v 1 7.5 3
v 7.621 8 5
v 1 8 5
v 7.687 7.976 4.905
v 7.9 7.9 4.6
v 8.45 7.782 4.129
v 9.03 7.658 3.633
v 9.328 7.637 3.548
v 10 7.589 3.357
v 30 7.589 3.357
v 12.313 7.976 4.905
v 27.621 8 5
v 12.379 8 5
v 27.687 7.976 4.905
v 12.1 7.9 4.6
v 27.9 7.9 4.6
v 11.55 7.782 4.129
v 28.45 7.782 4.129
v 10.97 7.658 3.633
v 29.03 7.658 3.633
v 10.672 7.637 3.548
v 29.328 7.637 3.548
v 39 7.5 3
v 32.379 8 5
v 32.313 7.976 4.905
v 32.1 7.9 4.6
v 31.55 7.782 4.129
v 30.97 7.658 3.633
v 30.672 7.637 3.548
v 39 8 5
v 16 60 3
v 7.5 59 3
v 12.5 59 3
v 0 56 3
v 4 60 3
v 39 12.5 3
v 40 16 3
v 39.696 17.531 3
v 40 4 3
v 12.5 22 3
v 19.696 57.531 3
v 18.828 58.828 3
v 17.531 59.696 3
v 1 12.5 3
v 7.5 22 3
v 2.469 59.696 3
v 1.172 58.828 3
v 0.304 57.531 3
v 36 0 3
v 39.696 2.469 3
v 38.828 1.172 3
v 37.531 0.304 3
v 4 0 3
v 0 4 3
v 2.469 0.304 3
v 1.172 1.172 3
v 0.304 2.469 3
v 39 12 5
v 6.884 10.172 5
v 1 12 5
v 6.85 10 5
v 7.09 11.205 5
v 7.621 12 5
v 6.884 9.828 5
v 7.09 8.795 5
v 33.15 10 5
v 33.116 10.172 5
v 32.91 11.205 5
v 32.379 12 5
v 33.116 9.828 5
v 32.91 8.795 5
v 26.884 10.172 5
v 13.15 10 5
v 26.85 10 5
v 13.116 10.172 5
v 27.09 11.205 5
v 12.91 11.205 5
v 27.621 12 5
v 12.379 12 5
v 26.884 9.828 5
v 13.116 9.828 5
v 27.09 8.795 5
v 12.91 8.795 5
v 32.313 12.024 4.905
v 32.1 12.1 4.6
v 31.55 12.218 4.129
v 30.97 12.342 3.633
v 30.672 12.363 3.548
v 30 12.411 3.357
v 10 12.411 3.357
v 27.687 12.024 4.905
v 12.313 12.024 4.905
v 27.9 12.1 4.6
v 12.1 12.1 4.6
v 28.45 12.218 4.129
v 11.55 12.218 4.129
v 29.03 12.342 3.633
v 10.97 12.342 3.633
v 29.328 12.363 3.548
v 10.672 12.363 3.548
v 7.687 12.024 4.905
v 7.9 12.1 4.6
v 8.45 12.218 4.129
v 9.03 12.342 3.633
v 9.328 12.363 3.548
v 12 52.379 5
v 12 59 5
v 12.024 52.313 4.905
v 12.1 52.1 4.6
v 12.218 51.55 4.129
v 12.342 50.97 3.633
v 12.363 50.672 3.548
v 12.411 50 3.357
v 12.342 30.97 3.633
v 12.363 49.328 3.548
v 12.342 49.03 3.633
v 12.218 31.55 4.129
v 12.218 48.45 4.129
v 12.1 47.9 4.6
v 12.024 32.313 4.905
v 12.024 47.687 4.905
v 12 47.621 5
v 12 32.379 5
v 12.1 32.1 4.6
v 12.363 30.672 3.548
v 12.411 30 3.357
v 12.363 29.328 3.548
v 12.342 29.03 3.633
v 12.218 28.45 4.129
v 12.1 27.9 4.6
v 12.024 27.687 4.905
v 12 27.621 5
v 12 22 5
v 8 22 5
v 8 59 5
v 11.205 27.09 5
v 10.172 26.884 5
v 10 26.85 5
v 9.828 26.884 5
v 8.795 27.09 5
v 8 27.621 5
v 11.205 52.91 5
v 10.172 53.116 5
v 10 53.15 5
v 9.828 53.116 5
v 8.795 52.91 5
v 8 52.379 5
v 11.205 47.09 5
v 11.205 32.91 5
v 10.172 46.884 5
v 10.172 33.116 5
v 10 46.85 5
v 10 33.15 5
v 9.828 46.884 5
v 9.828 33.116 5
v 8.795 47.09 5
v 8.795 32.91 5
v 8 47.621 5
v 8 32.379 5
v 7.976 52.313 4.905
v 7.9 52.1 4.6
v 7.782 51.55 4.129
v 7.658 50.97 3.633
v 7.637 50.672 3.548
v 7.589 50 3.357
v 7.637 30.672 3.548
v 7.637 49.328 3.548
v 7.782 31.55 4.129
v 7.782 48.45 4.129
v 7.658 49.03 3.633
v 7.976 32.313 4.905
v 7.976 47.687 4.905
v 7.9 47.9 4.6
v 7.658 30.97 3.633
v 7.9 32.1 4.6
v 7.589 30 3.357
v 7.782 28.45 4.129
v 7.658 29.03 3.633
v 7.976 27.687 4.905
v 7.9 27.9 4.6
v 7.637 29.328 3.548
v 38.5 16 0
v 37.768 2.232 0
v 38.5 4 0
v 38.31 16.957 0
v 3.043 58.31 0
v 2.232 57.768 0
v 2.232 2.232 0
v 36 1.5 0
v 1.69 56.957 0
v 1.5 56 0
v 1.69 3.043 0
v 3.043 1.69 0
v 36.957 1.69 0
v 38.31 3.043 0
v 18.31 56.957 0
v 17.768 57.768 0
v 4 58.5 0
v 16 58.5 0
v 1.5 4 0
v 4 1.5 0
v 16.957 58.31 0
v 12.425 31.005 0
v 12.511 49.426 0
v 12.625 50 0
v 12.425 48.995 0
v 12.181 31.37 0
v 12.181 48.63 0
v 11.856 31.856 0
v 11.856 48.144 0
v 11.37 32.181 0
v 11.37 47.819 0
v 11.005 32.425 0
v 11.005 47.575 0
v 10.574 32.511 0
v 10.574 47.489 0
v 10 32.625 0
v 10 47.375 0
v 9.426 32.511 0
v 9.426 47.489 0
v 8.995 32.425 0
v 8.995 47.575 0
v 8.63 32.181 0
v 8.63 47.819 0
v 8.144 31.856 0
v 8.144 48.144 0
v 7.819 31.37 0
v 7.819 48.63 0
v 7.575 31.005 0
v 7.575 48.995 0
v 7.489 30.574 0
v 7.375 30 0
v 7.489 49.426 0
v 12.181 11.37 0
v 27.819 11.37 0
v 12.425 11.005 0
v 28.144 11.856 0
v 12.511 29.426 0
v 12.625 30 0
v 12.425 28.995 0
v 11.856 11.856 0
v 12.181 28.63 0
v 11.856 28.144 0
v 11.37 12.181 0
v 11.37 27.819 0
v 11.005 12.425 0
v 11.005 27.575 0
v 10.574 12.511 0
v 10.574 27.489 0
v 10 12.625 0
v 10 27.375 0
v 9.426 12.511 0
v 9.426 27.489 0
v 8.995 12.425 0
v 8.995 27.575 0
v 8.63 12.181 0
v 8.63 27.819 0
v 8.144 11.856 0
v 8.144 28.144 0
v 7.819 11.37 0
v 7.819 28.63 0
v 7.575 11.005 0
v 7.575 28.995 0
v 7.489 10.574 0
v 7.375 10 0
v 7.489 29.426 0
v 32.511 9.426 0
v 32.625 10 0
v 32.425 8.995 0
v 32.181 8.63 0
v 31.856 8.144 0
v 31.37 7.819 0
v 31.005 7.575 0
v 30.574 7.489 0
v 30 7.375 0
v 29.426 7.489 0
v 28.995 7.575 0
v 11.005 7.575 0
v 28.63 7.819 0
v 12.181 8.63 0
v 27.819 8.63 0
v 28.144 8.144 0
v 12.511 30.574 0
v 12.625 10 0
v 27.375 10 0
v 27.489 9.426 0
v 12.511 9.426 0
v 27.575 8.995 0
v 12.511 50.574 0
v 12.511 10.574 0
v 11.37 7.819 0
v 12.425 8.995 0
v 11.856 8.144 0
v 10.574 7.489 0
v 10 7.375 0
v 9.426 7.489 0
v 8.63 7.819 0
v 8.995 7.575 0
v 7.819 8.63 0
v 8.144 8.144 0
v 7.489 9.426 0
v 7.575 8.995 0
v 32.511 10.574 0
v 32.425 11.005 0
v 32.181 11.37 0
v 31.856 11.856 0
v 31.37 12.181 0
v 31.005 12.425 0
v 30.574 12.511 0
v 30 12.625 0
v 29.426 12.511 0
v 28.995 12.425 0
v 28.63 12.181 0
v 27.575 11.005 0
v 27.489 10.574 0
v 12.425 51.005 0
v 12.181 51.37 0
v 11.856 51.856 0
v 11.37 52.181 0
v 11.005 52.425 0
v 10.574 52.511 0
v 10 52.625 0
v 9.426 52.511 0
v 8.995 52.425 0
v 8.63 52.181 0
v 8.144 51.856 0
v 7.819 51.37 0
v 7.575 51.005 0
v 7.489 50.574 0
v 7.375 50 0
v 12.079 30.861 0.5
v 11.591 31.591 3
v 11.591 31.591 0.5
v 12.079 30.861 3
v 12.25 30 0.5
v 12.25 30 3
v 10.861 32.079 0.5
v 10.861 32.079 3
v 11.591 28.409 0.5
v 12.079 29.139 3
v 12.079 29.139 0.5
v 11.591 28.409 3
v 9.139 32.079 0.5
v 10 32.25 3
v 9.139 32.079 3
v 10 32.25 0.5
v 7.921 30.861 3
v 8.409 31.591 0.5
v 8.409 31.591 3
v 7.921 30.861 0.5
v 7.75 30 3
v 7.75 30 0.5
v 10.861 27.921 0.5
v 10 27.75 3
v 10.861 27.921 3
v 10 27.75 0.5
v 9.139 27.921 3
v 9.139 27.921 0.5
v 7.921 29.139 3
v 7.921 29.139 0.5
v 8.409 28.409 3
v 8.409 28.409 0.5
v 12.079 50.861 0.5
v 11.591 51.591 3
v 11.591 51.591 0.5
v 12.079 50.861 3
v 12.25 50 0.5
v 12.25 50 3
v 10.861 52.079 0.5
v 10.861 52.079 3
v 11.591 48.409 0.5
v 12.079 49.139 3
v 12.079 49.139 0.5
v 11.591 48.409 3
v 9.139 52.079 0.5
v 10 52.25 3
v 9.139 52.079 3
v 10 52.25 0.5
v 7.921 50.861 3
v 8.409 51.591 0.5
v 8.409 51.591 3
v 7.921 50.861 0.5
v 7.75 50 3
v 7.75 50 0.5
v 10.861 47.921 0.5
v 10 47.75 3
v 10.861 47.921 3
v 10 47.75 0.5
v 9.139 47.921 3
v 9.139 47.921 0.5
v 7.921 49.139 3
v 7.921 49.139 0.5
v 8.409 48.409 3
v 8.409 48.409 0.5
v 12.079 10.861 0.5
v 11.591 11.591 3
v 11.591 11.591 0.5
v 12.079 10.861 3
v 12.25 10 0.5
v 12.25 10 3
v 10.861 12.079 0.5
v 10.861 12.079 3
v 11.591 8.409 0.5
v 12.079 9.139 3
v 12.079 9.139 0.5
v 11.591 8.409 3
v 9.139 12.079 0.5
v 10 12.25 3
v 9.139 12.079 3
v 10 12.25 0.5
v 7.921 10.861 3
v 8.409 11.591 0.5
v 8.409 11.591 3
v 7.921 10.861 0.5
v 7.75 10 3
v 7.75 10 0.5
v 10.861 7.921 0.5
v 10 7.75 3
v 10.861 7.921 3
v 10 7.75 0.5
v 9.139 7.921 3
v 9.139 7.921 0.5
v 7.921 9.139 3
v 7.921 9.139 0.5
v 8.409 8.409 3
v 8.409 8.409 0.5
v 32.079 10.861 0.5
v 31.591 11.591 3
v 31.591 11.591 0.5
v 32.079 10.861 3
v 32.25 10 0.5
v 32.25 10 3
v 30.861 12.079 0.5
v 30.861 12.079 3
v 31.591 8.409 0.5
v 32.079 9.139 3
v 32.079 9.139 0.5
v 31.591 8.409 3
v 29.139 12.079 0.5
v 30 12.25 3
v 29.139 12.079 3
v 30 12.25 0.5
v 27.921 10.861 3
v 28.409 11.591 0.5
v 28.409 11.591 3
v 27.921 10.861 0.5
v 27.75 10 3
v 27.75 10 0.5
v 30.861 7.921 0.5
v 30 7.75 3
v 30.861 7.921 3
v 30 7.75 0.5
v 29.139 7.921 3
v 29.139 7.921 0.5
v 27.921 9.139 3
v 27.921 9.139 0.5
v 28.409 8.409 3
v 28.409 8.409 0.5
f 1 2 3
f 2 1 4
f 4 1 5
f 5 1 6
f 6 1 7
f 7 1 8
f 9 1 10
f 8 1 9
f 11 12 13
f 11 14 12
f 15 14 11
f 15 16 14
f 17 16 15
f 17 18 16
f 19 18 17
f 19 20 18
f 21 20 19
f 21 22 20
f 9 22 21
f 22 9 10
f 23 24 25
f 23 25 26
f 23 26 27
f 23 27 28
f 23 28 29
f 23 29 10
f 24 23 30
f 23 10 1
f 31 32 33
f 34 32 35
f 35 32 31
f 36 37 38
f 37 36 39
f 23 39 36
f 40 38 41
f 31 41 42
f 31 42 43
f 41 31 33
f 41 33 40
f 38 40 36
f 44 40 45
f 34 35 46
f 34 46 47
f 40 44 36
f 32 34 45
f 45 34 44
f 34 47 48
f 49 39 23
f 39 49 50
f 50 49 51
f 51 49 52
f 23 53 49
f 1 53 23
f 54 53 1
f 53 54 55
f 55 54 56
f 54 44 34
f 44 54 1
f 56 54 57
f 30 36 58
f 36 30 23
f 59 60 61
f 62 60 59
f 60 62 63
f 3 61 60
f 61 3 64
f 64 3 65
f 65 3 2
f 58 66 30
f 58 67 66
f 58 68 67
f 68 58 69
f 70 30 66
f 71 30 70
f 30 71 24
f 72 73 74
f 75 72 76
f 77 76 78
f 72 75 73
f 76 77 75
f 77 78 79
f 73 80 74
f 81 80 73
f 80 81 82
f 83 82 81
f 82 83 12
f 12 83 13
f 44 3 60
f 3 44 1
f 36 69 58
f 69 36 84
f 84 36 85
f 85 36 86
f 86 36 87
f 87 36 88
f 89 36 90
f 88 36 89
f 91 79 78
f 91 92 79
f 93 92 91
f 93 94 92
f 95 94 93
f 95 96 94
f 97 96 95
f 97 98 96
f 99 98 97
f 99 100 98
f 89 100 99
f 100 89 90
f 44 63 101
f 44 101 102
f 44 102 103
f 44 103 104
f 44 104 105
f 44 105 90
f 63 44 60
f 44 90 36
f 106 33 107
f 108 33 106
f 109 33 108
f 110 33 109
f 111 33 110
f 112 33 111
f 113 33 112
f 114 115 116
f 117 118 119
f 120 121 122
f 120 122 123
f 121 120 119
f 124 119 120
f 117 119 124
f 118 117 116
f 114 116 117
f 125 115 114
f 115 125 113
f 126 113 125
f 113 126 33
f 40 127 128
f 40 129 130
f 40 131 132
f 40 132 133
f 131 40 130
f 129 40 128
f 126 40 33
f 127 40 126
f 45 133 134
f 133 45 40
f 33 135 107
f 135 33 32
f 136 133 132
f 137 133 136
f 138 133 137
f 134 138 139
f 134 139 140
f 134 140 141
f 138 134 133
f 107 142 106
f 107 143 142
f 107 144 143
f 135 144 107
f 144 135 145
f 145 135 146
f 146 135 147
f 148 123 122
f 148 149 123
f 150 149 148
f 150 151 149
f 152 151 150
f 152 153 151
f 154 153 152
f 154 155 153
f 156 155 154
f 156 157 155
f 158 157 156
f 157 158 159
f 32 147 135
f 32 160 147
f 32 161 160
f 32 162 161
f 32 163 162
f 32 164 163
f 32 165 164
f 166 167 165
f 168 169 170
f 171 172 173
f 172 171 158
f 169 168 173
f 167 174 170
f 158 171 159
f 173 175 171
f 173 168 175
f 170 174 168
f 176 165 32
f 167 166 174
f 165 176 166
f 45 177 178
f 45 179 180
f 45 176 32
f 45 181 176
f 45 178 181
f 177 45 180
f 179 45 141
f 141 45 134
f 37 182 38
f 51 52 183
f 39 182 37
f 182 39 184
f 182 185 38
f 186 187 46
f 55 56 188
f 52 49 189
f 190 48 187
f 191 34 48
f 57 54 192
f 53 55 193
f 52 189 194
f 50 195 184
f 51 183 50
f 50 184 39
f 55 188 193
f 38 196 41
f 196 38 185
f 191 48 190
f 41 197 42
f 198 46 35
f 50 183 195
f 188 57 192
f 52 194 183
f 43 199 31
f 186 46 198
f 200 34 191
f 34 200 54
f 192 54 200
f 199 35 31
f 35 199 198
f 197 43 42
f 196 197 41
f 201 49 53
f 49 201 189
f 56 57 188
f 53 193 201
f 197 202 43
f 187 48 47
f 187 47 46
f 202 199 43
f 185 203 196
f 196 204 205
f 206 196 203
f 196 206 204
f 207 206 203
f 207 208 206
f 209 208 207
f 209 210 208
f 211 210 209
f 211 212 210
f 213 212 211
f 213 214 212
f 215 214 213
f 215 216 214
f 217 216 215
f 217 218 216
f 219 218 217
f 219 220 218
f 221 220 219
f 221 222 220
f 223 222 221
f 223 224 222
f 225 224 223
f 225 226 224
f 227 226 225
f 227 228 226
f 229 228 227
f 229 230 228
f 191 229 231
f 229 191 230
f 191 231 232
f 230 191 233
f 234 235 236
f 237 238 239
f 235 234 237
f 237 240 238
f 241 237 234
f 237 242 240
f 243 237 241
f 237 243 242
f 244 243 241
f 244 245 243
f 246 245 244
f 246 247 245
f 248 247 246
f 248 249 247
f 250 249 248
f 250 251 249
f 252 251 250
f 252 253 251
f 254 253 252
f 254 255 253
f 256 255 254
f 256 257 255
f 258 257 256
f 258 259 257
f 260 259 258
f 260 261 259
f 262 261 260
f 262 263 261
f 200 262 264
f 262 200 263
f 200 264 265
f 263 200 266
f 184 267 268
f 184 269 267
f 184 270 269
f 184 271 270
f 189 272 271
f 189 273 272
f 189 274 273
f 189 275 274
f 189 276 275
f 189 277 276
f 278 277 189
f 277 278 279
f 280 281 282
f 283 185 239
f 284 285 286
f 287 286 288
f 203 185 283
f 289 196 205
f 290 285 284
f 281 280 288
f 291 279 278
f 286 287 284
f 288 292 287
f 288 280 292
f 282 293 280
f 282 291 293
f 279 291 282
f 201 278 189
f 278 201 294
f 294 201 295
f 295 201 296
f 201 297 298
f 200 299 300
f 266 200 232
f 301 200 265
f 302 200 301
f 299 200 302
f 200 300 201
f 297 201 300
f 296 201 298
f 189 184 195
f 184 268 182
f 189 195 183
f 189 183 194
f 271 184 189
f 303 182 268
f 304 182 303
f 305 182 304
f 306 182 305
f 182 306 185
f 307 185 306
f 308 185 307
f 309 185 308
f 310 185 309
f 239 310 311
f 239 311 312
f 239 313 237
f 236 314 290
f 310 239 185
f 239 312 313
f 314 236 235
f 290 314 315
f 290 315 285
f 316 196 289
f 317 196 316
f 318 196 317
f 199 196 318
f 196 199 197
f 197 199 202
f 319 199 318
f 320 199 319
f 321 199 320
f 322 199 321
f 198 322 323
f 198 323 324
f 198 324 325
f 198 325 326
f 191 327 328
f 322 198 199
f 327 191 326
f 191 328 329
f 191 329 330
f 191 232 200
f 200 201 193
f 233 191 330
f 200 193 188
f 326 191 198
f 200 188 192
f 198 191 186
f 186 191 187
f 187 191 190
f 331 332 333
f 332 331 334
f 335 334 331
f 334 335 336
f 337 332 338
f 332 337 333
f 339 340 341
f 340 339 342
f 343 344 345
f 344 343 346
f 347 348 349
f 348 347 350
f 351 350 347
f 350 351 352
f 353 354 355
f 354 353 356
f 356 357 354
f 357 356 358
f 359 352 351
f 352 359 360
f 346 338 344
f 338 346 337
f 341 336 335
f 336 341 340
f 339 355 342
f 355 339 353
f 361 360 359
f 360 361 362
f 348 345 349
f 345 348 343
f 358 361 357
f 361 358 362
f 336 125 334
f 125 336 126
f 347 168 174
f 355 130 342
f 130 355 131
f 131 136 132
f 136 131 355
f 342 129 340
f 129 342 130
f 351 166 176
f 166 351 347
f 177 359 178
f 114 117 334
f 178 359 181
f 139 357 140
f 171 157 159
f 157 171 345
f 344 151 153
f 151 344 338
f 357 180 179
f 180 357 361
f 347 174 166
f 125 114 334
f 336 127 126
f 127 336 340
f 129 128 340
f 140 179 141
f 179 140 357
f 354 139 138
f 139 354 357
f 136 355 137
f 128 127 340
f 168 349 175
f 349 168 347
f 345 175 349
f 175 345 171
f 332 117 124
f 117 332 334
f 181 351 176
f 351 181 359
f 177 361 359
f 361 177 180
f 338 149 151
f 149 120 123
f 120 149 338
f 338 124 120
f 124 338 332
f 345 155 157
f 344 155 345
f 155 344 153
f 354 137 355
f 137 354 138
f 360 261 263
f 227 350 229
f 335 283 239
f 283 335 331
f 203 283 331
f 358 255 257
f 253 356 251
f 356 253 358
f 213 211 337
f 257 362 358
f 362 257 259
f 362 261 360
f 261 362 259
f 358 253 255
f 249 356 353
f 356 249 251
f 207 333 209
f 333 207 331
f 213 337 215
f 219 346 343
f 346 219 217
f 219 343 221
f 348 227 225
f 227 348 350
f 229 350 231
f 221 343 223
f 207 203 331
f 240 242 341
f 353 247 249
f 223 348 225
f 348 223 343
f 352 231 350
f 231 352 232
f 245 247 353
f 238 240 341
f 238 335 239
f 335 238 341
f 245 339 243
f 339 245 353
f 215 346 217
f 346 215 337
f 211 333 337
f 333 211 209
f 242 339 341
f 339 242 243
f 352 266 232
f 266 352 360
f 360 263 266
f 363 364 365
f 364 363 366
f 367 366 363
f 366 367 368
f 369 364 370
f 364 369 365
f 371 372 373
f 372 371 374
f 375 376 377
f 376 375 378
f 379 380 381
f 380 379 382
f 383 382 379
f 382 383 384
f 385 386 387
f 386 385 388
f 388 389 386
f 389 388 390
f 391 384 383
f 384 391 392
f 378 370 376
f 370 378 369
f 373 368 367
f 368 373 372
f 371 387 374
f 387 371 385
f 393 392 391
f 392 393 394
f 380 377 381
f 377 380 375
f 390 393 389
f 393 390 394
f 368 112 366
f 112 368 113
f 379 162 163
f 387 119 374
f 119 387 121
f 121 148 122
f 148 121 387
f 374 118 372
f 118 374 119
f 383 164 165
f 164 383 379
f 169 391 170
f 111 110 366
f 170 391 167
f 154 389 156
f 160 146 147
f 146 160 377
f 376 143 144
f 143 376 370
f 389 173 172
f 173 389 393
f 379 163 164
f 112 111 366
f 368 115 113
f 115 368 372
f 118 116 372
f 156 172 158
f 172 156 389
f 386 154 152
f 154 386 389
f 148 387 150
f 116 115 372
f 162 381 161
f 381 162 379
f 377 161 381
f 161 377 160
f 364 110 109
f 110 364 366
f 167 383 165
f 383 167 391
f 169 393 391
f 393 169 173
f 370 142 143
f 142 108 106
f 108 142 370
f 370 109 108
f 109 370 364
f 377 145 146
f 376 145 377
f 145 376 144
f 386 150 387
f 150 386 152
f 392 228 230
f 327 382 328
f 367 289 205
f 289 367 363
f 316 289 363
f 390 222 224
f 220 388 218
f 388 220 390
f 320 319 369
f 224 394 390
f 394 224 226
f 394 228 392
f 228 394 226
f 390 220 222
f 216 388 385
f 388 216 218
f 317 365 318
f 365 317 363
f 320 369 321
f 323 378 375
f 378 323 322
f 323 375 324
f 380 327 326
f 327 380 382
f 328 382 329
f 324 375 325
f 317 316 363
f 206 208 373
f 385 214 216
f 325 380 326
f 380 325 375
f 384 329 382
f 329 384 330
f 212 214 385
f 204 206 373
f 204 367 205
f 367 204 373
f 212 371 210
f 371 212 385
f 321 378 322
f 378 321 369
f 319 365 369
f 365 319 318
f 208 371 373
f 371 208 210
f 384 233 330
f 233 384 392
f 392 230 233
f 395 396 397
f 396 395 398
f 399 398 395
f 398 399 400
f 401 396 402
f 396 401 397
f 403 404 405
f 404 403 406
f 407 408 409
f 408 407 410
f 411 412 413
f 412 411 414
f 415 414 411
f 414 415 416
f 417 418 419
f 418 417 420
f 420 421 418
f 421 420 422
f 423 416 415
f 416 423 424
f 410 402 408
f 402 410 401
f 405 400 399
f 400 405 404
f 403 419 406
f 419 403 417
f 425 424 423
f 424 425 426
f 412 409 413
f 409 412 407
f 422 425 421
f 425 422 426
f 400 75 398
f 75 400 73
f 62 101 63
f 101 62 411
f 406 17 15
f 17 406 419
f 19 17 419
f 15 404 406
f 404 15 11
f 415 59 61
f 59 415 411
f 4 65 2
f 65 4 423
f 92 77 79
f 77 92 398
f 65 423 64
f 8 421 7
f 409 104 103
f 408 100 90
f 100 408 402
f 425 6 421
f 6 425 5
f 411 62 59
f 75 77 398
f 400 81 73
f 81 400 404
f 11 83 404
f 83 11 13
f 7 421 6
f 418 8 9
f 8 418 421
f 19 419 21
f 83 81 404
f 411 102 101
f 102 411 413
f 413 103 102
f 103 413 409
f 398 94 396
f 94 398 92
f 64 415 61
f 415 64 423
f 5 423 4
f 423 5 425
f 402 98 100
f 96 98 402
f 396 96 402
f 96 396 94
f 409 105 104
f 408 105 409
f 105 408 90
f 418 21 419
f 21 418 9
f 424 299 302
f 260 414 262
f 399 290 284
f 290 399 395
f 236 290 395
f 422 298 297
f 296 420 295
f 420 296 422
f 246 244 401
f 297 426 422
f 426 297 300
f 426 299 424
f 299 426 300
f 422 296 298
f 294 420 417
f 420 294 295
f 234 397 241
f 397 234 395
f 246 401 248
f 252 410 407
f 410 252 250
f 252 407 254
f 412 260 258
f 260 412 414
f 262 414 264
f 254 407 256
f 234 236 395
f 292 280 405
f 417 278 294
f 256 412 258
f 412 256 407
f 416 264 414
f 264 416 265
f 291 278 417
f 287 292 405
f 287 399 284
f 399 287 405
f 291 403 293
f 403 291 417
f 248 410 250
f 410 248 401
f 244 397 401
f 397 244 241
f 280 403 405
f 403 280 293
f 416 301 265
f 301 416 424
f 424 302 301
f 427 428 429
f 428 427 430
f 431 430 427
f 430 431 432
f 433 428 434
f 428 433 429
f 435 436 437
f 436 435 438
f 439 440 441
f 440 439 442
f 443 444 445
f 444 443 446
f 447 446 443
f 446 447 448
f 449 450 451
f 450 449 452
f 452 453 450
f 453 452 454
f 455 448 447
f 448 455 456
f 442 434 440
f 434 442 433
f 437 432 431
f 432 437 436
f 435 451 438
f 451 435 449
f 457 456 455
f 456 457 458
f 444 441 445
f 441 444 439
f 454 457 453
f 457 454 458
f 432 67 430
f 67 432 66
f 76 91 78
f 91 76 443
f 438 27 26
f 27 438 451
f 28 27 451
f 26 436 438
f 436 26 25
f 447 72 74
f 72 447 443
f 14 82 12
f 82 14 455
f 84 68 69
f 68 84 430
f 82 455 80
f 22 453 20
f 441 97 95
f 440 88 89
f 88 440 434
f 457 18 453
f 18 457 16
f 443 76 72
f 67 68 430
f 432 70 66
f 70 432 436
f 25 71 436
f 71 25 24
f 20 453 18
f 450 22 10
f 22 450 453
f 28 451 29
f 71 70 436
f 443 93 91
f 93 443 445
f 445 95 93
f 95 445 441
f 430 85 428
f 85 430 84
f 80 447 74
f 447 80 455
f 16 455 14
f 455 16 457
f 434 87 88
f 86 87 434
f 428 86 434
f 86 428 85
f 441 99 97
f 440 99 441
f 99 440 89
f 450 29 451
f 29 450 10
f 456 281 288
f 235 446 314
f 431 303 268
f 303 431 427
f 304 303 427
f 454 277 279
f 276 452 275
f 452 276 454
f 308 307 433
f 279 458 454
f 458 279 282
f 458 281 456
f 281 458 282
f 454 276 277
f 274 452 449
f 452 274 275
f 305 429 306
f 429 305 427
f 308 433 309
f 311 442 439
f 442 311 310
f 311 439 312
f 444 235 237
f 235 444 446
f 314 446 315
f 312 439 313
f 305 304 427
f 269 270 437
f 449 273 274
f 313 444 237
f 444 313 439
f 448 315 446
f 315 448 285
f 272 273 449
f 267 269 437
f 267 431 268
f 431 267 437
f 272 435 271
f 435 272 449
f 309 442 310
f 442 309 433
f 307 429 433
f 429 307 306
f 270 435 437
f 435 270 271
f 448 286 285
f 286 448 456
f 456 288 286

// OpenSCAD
// Width of extrusion beams
customizer_extrusion_w = 20;
// Width of channel in extrusion. Set to 0 to disable guides.
customizer_channel_w = 5;
// Number of holes of the base (the side with the guides the full length)
customizer_base_holes = 2;
// Number of holes of the riser (the side with partial length guides)
customizer_riser_holes = 2;
// Radius of mounting holes
customizer_hole_r = 2.25;
// Enable T bracket mode
customizer_t_bracket = 0; // [0,1]
// Thickness of the solid section of the bracket
thickness = 3;

module trapezoid(width_base, width_top,height,thickness) {

  linear_extrude(height = thickness) polygon(points=[[0,0],[width_base,0],[width_base-(width_base-width_top)/2,height],[(width_base-width_top)/2,height]], paths=[[0,1,2,3]]); 
  
}
        
// extrusion_w: Wide of extrusion pieces
// channel_w: Width of the extrusion's channel (guide will slope from this size to 80% of this size and be 40% of this size tall)
// base_holes: Number of mounting holes on the base (the side where the channel goes the entire length of the side)
// riser_holes: Number of mounting holes on the riser
// hole_r: Size of mounting holes
// corner_r: Corner rounding. Defaults to 25% extrusion width. 0 < corner_r <= 0.5 * extrusion_width
module l_bracket(extrusion_w, channel_w, base_holes, riser_holes, hole_r, corner_r = 0) {
    side_slope = 1.5;
    corner_r = corner_r <= 0 ? 0.2 * extrusion_w : corner_r > extrusion_w / 2 ? extrusion_w / 2 : corner_r;
    difference() {
        union() {
            hull() {
                perim_r1 = max(corner_r - side_slope, 0);
                // Origin corner
                translate([corner_r, corner_r, 0]) cylinder(r1=perim_r1, r2=corner_r, h=thickness, $fn=16);
                // Bottom right corner
                translate([(extrusion_w * base_holes) - corner_r, corner_r, 0]) cylinder(r1=perim_r1, r2=corner_r, h=thickness, $fn=16);
                // Top of base
                translate([(extrusion_w * base_holes) - corner_r, extrusion_w - corner_r, 0]) cylinder(r1=perim_r1, r2=corner_r, h=thickness, $fn=16);
                // Side of riser
                translate([corner_r, (extrusion_w * riser_holes) - corner_r + extrusion_w, 0]) cylinder(r1=perim_r1, r2=corner_r, h=thickness, $fn=16);
                // Top left corner
                translate([extrusion_w - corner_r, (extrusion_w * riser_holes) - corner_r + extrusion_w, 0]) cylinder(r1=perim_r1, r2=corner_r, h=thickness, $fn=16);
            }
            
            if (channel_w > 0)
            {
                translate([1, extrusion_w / 2 - channel_w / 2, thickness]) rotate([90, 0, 90]) trapezoid(channel_w, channel_w * 0.8, channel_w * 0.4, extrusion_w * base_holes - 2);
                translate([extrusion_w * 0.5 + channel_w * 0.5, extrusion_w * 1.1, thickness]) rotate([0, 90, 0]) rotate([0, 90, 90]) trapezoid(channel_w, channel_w * 0.8, channel_w * 0.4, extrusion_w * riser_holes - (extrusion_w * 0.1) - 1);
            }
        }
        for(i=[extrusion_w * 1.5:extrusion_w:extrusion_w * (0.5 + riser_holes)]) {
            translate([extrusion_w / 2, i, -1]) cylinder(r=hole_r, h=thickness + channel_w + 2, $fn=16);
            translate([extrusion_w / 2, i, thickness]) cylinder(r1=hole_r, r2 = hole_r * 1.5, h=channel_w * 0.5, $fn=16);
            translate([extrusion_w / 2, i, -1]) cylinder(r1=hole_r * 1.5, r2 = hole_r, h=1.5, $fn=16);
        }
        for(i=[extrusion_w/2:extrusion_w:extrusion_w * (0.5 + base_holes)]) {
            translate([i, extrusion_w / 2, -1]) cylinder(r=hole_r, h=thickness + channel_w + 2, $fn=16);
            translate([i, extrusion_w / 2, thickness]) cylinder(r1=hole_r, r2 = hole_r * 1.5, h=channel_w * 0.5, $fn=16);
            translate([i, extrusion_w / 2, -1]) cylinder(r1=hole_r * 1.5, r2 = hole_r, h=1.5, $fn=16);
        }

    }
}

// Cheap and dirty T bracket by mirroring and overlaying a pair of L brackets :)
module t_bracket(extrusion_w, channel_w, base_holes, riser_holes, hole_r, corner_r = 0) {
    l_bracket(extrusion_w, channel_w, base_holes, riser_holes, hole_r, corner_r);
    translate([extrusion_w, 0, 0]) mirror([1, 0, 0]) l_bracket(extrusion_w, channel_w, base_holes, riser_holes, hole_r, corner_r);
}

if (customizer_t_bracket > 0)
    t_bracket(customizer_extrusion_w, customizer_channel_w, customizer_base_holes, customizer_riser_holes, customizer_hole_r);
else
    l_bracket(customizer_extrusion_w, customizer_channel_w, customizer_base_holes, customizer_riser_holes, customizer_hole_r);
